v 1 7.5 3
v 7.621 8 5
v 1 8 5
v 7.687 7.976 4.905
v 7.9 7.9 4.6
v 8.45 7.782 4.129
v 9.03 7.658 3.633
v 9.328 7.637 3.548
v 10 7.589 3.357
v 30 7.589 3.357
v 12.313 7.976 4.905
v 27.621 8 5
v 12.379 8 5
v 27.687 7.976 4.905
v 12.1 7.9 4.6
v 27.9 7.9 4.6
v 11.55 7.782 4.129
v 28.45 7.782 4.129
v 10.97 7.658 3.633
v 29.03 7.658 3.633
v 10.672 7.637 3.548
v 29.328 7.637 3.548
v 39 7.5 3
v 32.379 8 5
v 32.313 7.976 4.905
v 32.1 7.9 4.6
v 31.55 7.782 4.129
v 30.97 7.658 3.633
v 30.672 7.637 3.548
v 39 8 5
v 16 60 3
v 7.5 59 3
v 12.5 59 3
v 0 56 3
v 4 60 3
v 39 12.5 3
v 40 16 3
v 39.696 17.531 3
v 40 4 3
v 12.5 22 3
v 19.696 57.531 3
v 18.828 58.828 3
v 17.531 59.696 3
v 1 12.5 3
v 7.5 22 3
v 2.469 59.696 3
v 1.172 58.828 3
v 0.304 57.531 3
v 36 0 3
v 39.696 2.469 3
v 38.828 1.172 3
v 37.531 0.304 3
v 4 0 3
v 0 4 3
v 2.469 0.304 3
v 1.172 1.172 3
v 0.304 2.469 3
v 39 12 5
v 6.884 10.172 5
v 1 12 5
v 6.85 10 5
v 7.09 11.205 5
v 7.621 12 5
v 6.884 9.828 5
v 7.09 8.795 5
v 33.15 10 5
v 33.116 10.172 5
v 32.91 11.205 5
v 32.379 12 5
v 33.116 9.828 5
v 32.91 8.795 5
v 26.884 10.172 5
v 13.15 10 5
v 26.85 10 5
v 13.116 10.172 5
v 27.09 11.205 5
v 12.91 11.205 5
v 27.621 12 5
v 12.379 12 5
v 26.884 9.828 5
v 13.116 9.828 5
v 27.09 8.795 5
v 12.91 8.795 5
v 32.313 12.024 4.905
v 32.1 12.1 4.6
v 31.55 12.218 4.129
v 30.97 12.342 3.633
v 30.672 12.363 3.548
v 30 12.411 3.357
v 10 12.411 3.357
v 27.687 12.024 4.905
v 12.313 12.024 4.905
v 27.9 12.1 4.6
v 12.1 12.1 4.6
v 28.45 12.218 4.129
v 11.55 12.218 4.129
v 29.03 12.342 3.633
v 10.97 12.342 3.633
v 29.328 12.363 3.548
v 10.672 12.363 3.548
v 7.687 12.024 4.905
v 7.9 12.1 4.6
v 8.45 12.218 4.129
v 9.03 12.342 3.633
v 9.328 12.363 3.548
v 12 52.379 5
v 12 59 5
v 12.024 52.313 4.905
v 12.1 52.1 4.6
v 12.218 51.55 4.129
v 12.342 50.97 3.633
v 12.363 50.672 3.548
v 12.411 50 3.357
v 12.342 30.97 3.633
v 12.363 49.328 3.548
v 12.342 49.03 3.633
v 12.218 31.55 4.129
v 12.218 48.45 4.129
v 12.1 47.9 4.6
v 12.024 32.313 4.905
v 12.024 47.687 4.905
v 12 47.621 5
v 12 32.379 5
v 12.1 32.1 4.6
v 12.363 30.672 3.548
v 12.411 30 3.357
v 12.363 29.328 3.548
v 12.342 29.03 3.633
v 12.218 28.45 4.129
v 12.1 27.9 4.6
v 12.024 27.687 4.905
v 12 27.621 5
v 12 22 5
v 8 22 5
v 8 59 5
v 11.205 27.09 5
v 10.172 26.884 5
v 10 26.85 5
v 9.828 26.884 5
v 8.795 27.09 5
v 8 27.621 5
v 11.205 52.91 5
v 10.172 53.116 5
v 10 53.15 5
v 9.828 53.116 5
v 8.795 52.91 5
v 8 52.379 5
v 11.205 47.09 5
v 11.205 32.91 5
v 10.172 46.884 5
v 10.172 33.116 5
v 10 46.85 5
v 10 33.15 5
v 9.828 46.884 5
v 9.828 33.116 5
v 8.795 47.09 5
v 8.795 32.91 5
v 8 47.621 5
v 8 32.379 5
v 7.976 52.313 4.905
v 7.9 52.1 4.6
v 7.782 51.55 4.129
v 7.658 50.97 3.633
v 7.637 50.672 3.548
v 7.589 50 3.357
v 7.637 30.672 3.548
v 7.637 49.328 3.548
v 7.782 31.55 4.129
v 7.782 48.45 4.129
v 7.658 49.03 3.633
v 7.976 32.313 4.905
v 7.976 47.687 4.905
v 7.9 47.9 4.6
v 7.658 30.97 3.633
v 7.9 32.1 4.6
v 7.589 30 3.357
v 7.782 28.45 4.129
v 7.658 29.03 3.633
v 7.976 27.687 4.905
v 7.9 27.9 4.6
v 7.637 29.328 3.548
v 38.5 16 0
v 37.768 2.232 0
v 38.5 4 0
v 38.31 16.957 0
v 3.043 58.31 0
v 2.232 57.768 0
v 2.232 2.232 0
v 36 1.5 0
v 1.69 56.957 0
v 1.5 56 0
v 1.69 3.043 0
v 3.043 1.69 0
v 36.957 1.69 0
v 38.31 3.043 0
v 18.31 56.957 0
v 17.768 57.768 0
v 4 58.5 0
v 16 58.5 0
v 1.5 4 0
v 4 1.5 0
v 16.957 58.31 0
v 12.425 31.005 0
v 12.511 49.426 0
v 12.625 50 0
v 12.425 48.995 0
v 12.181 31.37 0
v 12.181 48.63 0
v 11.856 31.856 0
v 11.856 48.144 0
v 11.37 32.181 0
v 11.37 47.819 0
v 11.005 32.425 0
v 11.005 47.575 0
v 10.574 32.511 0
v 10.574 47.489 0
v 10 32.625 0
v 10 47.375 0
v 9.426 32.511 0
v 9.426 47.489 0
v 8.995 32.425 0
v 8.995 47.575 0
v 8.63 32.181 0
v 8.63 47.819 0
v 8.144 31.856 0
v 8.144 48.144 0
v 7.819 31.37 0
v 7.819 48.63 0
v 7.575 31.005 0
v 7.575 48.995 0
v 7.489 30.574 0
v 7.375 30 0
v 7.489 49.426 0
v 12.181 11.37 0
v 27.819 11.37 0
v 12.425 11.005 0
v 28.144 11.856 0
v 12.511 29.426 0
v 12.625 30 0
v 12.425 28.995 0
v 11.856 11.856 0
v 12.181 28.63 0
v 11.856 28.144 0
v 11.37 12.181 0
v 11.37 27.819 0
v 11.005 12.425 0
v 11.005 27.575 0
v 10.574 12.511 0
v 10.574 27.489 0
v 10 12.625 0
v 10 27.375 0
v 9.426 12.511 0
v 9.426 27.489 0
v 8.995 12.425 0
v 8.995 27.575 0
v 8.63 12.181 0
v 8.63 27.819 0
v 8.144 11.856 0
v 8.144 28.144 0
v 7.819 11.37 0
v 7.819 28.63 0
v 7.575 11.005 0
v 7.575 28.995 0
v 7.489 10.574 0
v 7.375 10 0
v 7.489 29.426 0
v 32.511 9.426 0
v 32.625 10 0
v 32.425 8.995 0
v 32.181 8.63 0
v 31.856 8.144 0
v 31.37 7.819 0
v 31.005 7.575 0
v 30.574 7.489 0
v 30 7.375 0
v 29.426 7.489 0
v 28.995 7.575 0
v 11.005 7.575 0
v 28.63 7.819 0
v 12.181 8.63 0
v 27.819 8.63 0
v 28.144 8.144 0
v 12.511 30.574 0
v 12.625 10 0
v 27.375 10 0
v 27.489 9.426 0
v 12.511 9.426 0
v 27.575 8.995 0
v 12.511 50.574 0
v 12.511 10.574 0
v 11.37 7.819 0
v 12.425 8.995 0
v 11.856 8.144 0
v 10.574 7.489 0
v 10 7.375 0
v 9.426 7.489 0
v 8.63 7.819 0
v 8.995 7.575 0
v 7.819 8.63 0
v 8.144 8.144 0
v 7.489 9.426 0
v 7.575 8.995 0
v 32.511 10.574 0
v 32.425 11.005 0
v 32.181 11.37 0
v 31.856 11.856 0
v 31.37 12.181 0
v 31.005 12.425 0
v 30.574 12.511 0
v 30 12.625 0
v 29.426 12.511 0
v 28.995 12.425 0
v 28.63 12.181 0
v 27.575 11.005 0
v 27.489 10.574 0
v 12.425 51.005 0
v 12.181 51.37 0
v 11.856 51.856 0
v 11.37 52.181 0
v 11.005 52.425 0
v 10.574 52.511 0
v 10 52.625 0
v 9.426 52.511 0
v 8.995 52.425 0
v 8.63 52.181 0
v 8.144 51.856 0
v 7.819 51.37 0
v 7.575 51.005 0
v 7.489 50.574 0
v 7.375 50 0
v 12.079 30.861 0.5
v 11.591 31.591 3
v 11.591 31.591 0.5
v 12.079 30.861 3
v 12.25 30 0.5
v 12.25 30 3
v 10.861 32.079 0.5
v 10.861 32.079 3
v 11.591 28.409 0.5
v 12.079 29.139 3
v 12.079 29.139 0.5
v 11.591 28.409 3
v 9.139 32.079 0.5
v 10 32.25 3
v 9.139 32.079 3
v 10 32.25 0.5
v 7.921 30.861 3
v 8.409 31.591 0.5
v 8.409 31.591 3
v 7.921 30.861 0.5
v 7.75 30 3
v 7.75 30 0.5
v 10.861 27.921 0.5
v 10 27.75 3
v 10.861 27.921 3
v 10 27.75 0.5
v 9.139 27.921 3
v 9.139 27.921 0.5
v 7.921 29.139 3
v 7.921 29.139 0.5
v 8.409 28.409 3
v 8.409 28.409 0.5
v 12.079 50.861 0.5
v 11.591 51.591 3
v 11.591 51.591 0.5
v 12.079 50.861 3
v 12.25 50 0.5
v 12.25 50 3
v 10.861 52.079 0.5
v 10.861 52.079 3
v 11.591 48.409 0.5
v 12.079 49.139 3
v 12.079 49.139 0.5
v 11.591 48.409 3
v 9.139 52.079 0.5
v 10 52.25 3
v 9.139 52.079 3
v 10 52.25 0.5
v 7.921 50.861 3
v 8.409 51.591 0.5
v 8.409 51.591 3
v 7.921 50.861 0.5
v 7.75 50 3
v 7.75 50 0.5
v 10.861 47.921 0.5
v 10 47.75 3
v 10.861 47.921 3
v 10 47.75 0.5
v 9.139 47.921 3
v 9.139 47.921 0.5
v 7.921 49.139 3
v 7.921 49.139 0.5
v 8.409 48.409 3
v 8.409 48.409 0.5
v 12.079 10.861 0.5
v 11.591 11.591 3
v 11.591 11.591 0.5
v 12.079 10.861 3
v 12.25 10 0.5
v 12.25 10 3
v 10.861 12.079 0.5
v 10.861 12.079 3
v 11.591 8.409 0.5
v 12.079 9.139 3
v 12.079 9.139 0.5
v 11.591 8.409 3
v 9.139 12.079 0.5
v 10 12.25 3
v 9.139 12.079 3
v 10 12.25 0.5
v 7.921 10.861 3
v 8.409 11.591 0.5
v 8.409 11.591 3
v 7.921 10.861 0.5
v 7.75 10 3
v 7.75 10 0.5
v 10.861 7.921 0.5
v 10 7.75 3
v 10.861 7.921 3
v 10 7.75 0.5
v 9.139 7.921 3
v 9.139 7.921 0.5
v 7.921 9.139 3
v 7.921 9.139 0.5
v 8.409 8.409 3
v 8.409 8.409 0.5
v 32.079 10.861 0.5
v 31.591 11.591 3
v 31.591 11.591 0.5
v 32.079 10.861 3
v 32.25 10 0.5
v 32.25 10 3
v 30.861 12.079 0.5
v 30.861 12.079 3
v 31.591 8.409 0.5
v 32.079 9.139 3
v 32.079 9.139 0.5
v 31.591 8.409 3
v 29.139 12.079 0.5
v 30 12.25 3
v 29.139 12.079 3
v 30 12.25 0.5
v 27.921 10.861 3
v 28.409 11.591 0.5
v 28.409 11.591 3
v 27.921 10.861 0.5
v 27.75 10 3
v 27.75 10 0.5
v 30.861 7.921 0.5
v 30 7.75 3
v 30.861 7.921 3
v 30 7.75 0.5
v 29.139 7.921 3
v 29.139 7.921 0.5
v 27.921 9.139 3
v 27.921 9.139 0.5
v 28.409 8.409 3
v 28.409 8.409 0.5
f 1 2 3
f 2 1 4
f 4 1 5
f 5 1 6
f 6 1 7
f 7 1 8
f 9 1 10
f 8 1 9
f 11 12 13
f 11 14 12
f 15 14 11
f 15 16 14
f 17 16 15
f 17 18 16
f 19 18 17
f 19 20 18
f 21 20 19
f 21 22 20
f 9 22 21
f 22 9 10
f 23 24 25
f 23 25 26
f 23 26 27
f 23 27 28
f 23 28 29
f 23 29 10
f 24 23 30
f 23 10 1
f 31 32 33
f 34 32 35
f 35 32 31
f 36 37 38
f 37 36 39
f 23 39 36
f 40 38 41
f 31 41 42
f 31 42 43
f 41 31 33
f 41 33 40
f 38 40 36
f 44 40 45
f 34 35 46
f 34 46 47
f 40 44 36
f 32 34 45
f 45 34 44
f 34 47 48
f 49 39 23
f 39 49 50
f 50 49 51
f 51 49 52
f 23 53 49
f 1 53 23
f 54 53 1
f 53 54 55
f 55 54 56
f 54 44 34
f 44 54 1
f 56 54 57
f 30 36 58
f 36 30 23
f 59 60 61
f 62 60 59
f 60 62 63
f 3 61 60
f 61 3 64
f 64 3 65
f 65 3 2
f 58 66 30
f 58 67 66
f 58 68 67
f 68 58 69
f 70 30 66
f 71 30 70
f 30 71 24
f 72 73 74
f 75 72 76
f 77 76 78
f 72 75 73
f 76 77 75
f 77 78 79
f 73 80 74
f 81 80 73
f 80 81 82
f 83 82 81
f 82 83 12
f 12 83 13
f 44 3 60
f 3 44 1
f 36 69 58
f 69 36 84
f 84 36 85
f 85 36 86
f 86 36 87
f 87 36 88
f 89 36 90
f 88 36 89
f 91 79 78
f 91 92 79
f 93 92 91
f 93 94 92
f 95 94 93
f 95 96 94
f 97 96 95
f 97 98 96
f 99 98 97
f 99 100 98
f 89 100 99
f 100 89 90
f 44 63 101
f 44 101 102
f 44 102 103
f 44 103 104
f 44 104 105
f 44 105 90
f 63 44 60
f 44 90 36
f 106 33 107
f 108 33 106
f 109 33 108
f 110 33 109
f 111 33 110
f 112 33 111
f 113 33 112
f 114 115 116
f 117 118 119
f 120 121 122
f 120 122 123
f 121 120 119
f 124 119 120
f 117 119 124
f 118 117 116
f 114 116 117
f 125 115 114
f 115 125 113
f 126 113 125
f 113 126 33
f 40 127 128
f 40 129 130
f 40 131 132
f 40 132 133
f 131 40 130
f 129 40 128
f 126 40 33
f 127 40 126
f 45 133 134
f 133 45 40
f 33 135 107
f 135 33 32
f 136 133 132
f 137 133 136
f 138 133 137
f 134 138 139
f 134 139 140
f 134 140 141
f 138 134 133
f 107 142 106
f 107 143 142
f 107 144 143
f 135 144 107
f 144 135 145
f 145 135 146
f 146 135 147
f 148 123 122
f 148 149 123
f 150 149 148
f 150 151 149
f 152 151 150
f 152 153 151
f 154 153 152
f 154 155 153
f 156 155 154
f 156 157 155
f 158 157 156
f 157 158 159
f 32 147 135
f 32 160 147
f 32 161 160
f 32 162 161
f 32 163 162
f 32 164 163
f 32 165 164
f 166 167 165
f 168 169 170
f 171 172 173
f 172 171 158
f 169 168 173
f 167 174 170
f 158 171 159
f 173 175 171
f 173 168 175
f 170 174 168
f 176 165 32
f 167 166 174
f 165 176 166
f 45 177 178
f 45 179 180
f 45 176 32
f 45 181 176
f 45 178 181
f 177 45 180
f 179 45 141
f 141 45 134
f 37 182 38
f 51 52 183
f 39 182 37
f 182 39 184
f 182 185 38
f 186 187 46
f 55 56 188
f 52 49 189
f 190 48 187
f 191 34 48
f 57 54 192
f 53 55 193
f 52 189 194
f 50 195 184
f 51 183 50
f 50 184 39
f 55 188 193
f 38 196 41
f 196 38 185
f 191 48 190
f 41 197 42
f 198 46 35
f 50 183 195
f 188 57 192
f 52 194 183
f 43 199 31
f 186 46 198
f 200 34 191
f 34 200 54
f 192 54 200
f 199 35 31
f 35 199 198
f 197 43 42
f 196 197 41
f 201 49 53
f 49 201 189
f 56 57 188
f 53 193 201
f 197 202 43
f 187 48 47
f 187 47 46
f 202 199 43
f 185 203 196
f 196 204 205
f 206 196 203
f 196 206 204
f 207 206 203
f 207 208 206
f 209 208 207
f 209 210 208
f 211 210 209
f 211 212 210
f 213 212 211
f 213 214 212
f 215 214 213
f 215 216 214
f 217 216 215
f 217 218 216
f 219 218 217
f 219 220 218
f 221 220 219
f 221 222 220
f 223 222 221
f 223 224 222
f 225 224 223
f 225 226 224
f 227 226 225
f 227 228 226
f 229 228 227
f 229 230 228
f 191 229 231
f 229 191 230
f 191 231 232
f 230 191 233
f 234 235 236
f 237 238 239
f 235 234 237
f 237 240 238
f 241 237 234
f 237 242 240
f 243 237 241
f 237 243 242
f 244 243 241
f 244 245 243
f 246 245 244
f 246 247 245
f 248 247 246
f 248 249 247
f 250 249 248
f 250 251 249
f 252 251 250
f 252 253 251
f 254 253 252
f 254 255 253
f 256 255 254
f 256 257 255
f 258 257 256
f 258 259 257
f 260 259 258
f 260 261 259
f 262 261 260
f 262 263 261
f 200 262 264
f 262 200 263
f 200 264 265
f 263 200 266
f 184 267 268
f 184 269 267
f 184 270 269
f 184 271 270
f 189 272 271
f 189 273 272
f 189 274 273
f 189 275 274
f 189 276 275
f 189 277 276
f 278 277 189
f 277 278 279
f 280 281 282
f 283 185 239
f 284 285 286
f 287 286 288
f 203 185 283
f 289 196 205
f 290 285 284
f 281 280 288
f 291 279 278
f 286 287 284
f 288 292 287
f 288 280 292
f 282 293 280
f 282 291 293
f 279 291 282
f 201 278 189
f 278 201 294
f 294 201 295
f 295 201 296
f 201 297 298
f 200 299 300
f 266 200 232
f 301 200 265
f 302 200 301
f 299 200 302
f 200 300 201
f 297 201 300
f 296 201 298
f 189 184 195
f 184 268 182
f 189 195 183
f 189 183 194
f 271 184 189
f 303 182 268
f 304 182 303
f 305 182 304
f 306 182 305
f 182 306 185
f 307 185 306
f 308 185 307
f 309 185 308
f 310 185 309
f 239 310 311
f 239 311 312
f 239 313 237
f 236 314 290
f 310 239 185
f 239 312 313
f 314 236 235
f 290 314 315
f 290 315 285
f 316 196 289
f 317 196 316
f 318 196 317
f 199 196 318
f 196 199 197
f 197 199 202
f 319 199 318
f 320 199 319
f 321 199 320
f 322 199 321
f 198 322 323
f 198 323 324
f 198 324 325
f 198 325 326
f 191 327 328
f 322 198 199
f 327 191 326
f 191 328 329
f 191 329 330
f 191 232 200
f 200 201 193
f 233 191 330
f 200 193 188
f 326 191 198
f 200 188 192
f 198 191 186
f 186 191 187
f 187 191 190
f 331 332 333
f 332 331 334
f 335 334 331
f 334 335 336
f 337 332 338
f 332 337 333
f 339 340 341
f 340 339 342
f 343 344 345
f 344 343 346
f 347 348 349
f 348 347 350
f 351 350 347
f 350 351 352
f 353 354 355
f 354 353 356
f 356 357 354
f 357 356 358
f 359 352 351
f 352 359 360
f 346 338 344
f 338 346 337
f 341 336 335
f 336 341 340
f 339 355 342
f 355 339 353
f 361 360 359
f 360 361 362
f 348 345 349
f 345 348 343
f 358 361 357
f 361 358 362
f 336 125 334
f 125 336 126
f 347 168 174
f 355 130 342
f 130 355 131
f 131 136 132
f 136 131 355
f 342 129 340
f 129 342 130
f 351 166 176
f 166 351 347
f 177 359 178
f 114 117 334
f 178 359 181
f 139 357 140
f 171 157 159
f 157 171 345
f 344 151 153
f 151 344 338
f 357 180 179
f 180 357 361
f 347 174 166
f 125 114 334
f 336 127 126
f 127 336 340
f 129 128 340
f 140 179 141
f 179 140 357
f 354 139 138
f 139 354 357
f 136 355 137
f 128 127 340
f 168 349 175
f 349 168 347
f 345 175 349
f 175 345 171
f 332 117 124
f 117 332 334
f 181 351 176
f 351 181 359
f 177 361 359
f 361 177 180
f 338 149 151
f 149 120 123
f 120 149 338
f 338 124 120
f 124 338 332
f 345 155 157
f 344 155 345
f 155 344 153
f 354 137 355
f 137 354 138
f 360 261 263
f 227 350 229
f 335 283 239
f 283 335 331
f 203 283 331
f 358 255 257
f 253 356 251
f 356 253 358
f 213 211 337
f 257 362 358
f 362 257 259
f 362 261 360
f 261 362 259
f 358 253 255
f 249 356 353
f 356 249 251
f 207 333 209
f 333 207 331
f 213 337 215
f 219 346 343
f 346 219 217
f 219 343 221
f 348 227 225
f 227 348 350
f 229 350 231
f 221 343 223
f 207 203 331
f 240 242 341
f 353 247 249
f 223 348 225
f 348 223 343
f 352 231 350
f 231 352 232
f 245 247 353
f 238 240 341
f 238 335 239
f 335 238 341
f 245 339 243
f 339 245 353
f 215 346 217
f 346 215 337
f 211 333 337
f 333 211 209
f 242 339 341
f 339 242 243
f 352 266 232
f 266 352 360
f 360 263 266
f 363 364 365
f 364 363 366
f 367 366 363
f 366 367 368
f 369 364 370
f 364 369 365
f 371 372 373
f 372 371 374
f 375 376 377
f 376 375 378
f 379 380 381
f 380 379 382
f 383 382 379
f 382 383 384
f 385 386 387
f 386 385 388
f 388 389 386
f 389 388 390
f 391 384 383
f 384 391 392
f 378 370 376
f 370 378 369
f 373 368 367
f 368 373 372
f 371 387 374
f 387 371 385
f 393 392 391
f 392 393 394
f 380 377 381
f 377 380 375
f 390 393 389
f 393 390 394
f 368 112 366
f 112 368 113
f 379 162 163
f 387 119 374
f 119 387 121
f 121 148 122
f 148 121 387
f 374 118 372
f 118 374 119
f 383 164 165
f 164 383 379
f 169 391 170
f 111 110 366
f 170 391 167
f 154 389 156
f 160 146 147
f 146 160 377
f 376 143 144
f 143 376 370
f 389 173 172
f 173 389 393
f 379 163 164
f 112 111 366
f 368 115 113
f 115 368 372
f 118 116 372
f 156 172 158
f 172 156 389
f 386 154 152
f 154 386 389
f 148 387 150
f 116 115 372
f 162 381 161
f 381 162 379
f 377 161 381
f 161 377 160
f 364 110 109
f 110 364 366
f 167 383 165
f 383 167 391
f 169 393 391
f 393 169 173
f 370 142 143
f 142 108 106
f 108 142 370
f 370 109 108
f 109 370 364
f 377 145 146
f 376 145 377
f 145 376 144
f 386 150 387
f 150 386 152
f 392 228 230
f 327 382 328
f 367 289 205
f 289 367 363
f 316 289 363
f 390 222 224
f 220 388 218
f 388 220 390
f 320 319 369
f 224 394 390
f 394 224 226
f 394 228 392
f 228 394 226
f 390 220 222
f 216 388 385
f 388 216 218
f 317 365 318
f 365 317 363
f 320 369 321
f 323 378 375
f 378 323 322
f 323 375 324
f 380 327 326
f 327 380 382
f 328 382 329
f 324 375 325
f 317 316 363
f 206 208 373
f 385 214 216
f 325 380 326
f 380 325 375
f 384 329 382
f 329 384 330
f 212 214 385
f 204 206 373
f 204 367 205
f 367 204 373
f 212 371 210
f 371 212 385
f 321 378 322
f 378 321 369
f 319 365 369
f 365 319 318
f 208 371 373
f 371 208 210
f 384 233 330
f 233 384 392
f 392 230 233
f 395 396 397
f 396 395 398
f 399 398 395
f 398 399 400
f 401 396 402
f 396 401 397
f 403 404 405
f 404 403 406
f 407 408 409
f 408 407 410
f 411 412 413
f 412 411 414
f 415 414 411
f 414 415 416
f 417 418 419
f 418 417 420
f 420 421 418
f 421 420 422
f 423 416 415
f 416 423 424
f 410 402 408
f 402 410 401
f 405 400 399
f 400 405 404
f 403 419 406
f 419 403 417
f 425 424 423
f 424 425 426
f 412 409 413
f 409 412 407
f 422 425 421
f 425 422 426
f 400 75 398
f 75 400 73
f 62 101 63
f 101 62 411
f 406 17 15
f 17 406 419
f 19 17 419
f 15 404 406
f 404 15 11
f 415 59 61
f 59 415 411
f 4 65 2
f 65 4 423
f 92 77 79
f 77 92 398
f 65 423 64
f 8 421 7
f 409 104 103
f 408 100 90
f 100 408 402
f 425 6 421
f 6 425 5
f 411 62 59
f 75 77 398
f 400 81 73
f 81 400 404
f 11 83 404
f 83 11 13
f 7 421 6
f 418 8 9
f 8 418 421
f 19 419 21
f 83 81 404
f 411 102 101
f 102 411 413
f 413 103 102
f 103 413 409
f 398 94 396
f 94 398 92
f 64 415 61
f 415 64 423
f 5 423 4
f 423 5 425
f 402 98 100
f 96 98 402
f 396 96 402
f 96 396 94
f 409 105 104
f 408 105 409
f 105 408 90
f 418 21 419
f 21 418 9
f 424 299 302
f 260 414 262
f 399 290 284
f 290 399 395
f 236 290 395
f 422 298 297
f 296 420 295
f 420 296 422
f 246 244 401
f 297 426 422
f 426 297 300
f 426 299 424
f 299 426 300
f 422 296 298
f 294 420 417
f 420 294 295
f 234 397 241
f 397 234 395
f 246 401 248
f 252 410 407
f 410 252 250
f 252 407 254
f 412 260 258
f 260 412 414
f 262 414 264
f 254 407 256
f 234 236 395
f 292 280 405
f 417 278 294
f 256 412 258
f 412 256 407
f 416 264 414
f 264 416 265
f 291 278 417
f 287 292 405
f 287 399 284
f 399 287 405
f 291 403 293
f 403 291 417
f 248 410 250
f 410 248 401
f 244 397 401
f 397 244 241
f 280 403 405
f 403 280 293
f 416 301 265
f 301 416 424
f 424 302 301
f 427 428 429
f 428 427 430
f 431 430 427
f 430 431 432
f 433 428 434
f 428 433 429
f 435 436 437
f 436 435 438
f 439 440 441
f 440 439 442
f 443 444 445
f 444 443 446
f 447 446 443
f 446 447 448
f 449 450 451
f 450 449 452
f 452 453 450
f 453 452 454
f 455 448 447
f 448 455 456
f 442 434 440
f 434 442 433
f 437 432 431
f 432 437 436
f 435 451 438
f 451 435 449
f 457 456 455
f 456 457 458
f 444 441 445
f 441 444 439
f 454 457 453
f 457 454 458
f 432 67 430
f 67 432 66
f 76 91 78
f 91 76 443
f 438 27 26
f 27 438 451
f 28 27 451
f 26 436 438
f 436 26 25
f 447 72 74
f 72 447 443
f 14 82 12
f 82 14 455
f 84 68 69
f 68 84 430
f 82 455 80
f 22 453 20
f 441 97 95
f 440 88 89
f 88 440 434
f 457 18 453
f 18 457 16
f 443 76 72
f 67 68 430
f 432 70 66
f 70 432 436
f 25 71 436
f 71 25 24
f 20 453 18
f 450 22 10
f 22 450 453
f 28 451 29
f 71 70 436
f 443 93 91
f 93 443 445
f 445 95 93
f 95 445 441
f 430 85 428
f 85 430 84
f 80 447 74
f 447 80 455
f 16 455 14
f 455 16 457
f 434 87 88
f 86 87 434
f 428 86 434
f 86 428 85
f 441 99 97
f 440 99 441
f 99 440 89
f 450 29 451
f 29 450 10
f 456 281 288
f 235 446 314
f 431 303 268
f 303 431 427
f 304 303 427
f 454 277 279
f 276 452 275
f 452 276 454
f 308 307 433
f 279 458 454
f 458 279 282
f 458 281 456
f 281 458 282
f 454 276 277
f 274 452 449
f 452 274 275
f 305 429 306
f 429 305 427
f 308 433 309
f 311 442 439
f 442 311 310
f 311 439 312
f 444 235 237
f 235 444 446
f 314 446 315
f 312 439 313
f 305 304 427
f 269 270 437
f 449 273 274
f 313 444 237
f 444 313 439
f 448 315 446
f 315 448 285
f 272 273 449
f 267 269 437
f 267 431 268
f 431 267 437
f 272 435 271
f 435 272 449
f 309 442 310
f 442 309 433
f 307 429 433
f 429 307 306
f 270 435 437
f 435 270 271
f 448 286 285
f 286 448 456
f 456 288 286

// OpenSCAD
// Width of extrusion beams
customizer_extrusion_w = 20;
// Width of channel in extrusion. Set to 0 to disable guides.
customizer_channel_w = 5;
// Number of holes of the base (the side with the guides the full length)
customizer_base_holes = 2;
// Number of holes of the riser (the side with partial length guides)
customizer_riser_holes = 2;
// Radius of mounting holes
customizer_hole_r = 2.25;
// Enable T bracket mode
customizer_t_bracket = 0; // [0,1]
// Thickness of the solid section of the bracket
thickness = 3;

module trapezoid(width_base, width_top,height,thickness) {

  linear_extrude(height = thickness) polygon(points=[[0,0],[width_base,0],[width_base-(width_base-width_top)/2,height],[(width_base-width_top)/2,height]], paths=[[0,1,2,3]]); 
  
}
        
// extrusion_w: Wide of extrusion pieces
// channel_w: Width of the extrusion's channel (guide will slope from this size to 80% of this size and be 40% of this size tall)
// base_holes: Number of mounting holes on the base (the side where the channel goes the entire length of the side)
// riser_holes: Number of mounting holes on the riser
// hole_r: Size of mounting holes
// corner_r: Corner rounding. Defaults to 25% extrusion width. 0 < corner_r <= 0.5 * extrusion_width
module l_bracket(extrusion_w, channel_w, base_holes, riser_holes, hole_r, corner_r = 0) {
    side_slope = 1.5;
    corner_r = corner_r <= 0 ? 0.2 * extrusion_w : corner_r > extrusion_w / 2 ? extrusion_w / 2 : corner_r;
    difference() {
        union() {
            hull() {
                perim_r1 = max(corner_r - side_slope, 0);
                // Origin corner
                translate([corner_r, corner_r, 0]) cylinder(r1=perim_r1, r2=corner_r, h=thickness, $fn=16);
                // Bottom right corner
                translate([(extrusion_w * base_holes) - corner_r, corner_r, 0]) cylinder(r1=perim_r1, r2=corner_r, h=thickness, $fn=16);
                // Top of base
                translate([(extrusion_w * base_holes) - corner_r, extrusion_w - corner_r, 0]) cylinder(r1=perim_r1, r2=corner_r, h=thickness, $fn=16);
                // Side of riser
                translate([corner_r, (extrusion_w * riser_holes) - corner_r + extrusion_w, 0]) cylinder(r1=perim_r1, r2=corner_r, h=thickness, $fn=16);
                // Top left corner
                translate([extrusion_w - corner_r, (extrusion_w * riser_holes) - corner_r + extrusion_w, 0]) cylinder(r1=perim_r1, r2=corner_r, h=thickness, $fn=16);
            }
            
            if (channel_w > 0)
            {
                translate([1, extrusion_w / 2 - channel_w / 2, thickness]) rotate([90, 0, 90]) trapezoid(channel_w, channel_w * 0.8, channel_w * 0.4, extrusion_w * base_holes - 2);
                translate([extrusion_w * 0.5 + channel_w * 0.5, extrusion_w * 1.1, thickness]) rotate([0, 90, 0]) rotate([0, 90, 90]) trapezoid(channel_w, channel_w * 0.8, channel_w * 0.4, extrusion_w * riser_holes - (extrusion_w * 0.1) - 1);
            }
        }
        for(i=[extrusion_w * 1.5:extrusion_w:extrusion_w * (0.5 + riser_holes)]) {
            translate([extrusion_w / 2, i, -1]) cylinder(r=hole_r, h=thickness + channel_w + 2, $fn=16);
            translate([extrusion_w / 2, i, thickness]) cylinder(r1=hole_r, r2 = hole_r * 1.5, h=channel_w * 0.5, $fn=16);
            translate([extrusion_w / 2, i, -1]) cylinder(r1=hole_r * 1.5, r2 = hole_r, h=1.5, $fn=16);
        }
        for(i=[extrusion_w/2:extrusion_w:extrusion_w * (0.5 + base_holes)]) {
            translate([i, extrusion_w / 2, -1]) cylinder(r=hole_r, h=thickness + channel_w + 2, $fn=16);
            translate([i, extrusion_w / 2, thickness]) cylinder(r1=hole_r, r2 = hole_r * 1.5, h=channel_w * 0.5, $fn=16);
            translate([i, extrusion_w / 2, -1]) cylinder(r1=hole_r * 1.5, r2 = hole_r, h=1.5, $fn=16);
        }

    }
}

// Cheap and dirty T bracket by mirroring and overlaying a pair of L brackets :)
module t_bracket(extrusion_w, channel_w, base_holes, riser_holes, hole_r, corner_r = 0) {
    l_bracket(extrusion_w, channel_w, base_holes, riser_holes, hole_r, corner_r);
    translate([extrusion_w, 0, 0]) mirror([1, 0, 0]) l_bracket(extrusion_w, channel_w, base_holes, riser_holes, hole_r, corner_r);
}

if (customizer_t_bracket > 0)
    t_bracket(customizer_extrusion_w, customizer_channel_w, customizer_base_holes, customizer_riser_holes, customizer_hole_r);
else
    l_bracket(customizer_extrusion_w, customizer_channel_w, customizer_base_holes, customizer_riser_holes, customizer_hole_r);
